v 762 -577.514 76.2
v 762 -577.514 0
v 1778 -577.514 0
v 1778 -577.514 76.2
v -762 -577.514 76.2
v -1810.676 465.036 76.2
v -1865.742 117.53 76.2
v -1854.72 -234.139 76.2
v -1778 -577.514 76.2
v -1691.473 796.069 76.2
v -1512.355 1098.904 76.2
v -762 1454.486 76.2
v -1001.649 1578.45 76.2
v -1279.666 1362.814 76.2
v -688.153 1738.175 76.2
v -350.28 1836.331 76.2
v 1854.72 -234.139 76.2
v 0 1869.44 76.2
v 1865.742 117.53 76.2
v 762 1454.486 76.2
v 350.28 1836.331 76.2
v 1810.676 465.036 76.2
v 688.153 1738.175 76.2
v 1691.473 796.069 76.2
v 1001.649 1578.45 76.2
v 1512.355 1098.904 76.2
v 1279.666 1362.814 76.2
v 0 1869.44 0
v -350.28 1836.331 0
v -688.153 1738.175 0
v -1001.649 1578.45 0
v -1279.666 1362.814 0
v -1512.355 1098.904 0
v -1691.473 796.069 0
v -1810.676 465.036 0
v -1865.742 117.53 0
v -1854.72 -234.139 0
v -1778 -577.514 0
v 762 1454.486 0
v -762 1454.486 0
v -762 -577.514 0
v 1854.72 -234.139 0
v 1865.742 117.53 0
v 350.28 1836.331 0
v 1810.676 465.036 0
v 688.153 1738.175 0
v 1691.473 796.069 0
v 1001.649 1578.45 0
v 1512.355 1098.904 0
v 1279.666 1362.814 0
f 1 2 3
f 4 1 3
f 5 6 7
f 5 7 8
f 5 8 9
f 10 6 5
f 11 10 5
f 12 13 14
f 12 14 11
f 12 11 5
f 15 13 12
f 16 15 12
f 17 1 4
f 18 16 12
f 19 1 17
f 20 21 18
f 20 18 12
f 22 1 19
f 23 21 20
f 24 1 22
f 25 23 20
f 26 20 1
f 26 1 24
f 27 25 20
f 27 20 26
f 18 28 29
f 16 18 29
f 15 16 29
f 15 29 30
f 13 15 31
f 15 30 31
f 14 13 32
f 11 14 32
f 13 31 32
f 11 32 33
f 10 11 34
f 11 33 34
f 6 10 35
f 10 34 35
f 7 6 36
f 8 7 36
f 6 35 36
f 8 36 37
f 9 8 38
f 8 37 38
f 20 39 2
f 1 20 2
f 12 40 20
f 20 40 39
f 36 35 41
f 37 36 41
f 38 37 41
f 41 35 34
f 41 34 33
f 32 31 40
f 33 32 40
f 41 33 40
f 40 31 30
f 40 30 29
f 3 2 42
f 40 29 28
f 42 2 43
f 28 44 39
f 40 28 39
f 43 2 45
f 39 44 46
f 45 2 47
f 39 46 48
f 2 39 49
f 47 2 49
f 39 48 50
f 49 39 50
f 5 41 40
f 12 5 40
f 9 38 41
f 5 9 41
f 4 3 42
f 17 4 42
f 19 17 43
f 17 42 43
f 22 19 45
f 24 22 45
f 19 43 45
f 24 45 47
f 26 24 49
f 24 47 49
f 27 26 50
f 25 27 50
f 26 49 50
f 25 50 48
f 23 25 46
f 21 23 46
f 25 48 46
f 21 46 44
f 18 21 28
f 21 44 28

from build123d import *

# Parameters (mm, degrees)
BOSS_EXTRUDE1_DEPTH = 76.2


with BuildPart() as part:
    # Sketch1 → Boss-Extrude1 (new body)
    with BuildSketch(Plane.XY):
        with BuildLine():
            ThreePointArc((1869.44, 0), (1321.893701021, 1321.893701021), (0, 1869.44))
            Line((0, 1869.44), (0, 1454.486438601))
            Line((0, 1454.486438601), (762, 1454.486438601))
            Line((762, 1454.486438601), (762, -577.513561399))
            Line((762, -577.513561399), (1778, -577.513561399))
            ThreePointArc((1778, -577.513561399), (1846.438495266, -292.353889661), (1869.44, 0))
        make_face()
        with BuildLine():
            ThreePointArc((0, 1869.44), (-1512.354598932, 1098.903763161), (-1778, -577.513561399))
            Line((-1778, -577.513561399), (-762, -577.513561399))
            Line((-762, -577.513561399), (-762, 1454.486438601))
            Line((-762, 1454.486438601), (0, 1454.486438601))
            Line((0, 1454.486438601), (0, 1869.44))
        make_face()
    extrude(amount=BOSS_EXTRUDE1_DEPTH)


solid = part.part
